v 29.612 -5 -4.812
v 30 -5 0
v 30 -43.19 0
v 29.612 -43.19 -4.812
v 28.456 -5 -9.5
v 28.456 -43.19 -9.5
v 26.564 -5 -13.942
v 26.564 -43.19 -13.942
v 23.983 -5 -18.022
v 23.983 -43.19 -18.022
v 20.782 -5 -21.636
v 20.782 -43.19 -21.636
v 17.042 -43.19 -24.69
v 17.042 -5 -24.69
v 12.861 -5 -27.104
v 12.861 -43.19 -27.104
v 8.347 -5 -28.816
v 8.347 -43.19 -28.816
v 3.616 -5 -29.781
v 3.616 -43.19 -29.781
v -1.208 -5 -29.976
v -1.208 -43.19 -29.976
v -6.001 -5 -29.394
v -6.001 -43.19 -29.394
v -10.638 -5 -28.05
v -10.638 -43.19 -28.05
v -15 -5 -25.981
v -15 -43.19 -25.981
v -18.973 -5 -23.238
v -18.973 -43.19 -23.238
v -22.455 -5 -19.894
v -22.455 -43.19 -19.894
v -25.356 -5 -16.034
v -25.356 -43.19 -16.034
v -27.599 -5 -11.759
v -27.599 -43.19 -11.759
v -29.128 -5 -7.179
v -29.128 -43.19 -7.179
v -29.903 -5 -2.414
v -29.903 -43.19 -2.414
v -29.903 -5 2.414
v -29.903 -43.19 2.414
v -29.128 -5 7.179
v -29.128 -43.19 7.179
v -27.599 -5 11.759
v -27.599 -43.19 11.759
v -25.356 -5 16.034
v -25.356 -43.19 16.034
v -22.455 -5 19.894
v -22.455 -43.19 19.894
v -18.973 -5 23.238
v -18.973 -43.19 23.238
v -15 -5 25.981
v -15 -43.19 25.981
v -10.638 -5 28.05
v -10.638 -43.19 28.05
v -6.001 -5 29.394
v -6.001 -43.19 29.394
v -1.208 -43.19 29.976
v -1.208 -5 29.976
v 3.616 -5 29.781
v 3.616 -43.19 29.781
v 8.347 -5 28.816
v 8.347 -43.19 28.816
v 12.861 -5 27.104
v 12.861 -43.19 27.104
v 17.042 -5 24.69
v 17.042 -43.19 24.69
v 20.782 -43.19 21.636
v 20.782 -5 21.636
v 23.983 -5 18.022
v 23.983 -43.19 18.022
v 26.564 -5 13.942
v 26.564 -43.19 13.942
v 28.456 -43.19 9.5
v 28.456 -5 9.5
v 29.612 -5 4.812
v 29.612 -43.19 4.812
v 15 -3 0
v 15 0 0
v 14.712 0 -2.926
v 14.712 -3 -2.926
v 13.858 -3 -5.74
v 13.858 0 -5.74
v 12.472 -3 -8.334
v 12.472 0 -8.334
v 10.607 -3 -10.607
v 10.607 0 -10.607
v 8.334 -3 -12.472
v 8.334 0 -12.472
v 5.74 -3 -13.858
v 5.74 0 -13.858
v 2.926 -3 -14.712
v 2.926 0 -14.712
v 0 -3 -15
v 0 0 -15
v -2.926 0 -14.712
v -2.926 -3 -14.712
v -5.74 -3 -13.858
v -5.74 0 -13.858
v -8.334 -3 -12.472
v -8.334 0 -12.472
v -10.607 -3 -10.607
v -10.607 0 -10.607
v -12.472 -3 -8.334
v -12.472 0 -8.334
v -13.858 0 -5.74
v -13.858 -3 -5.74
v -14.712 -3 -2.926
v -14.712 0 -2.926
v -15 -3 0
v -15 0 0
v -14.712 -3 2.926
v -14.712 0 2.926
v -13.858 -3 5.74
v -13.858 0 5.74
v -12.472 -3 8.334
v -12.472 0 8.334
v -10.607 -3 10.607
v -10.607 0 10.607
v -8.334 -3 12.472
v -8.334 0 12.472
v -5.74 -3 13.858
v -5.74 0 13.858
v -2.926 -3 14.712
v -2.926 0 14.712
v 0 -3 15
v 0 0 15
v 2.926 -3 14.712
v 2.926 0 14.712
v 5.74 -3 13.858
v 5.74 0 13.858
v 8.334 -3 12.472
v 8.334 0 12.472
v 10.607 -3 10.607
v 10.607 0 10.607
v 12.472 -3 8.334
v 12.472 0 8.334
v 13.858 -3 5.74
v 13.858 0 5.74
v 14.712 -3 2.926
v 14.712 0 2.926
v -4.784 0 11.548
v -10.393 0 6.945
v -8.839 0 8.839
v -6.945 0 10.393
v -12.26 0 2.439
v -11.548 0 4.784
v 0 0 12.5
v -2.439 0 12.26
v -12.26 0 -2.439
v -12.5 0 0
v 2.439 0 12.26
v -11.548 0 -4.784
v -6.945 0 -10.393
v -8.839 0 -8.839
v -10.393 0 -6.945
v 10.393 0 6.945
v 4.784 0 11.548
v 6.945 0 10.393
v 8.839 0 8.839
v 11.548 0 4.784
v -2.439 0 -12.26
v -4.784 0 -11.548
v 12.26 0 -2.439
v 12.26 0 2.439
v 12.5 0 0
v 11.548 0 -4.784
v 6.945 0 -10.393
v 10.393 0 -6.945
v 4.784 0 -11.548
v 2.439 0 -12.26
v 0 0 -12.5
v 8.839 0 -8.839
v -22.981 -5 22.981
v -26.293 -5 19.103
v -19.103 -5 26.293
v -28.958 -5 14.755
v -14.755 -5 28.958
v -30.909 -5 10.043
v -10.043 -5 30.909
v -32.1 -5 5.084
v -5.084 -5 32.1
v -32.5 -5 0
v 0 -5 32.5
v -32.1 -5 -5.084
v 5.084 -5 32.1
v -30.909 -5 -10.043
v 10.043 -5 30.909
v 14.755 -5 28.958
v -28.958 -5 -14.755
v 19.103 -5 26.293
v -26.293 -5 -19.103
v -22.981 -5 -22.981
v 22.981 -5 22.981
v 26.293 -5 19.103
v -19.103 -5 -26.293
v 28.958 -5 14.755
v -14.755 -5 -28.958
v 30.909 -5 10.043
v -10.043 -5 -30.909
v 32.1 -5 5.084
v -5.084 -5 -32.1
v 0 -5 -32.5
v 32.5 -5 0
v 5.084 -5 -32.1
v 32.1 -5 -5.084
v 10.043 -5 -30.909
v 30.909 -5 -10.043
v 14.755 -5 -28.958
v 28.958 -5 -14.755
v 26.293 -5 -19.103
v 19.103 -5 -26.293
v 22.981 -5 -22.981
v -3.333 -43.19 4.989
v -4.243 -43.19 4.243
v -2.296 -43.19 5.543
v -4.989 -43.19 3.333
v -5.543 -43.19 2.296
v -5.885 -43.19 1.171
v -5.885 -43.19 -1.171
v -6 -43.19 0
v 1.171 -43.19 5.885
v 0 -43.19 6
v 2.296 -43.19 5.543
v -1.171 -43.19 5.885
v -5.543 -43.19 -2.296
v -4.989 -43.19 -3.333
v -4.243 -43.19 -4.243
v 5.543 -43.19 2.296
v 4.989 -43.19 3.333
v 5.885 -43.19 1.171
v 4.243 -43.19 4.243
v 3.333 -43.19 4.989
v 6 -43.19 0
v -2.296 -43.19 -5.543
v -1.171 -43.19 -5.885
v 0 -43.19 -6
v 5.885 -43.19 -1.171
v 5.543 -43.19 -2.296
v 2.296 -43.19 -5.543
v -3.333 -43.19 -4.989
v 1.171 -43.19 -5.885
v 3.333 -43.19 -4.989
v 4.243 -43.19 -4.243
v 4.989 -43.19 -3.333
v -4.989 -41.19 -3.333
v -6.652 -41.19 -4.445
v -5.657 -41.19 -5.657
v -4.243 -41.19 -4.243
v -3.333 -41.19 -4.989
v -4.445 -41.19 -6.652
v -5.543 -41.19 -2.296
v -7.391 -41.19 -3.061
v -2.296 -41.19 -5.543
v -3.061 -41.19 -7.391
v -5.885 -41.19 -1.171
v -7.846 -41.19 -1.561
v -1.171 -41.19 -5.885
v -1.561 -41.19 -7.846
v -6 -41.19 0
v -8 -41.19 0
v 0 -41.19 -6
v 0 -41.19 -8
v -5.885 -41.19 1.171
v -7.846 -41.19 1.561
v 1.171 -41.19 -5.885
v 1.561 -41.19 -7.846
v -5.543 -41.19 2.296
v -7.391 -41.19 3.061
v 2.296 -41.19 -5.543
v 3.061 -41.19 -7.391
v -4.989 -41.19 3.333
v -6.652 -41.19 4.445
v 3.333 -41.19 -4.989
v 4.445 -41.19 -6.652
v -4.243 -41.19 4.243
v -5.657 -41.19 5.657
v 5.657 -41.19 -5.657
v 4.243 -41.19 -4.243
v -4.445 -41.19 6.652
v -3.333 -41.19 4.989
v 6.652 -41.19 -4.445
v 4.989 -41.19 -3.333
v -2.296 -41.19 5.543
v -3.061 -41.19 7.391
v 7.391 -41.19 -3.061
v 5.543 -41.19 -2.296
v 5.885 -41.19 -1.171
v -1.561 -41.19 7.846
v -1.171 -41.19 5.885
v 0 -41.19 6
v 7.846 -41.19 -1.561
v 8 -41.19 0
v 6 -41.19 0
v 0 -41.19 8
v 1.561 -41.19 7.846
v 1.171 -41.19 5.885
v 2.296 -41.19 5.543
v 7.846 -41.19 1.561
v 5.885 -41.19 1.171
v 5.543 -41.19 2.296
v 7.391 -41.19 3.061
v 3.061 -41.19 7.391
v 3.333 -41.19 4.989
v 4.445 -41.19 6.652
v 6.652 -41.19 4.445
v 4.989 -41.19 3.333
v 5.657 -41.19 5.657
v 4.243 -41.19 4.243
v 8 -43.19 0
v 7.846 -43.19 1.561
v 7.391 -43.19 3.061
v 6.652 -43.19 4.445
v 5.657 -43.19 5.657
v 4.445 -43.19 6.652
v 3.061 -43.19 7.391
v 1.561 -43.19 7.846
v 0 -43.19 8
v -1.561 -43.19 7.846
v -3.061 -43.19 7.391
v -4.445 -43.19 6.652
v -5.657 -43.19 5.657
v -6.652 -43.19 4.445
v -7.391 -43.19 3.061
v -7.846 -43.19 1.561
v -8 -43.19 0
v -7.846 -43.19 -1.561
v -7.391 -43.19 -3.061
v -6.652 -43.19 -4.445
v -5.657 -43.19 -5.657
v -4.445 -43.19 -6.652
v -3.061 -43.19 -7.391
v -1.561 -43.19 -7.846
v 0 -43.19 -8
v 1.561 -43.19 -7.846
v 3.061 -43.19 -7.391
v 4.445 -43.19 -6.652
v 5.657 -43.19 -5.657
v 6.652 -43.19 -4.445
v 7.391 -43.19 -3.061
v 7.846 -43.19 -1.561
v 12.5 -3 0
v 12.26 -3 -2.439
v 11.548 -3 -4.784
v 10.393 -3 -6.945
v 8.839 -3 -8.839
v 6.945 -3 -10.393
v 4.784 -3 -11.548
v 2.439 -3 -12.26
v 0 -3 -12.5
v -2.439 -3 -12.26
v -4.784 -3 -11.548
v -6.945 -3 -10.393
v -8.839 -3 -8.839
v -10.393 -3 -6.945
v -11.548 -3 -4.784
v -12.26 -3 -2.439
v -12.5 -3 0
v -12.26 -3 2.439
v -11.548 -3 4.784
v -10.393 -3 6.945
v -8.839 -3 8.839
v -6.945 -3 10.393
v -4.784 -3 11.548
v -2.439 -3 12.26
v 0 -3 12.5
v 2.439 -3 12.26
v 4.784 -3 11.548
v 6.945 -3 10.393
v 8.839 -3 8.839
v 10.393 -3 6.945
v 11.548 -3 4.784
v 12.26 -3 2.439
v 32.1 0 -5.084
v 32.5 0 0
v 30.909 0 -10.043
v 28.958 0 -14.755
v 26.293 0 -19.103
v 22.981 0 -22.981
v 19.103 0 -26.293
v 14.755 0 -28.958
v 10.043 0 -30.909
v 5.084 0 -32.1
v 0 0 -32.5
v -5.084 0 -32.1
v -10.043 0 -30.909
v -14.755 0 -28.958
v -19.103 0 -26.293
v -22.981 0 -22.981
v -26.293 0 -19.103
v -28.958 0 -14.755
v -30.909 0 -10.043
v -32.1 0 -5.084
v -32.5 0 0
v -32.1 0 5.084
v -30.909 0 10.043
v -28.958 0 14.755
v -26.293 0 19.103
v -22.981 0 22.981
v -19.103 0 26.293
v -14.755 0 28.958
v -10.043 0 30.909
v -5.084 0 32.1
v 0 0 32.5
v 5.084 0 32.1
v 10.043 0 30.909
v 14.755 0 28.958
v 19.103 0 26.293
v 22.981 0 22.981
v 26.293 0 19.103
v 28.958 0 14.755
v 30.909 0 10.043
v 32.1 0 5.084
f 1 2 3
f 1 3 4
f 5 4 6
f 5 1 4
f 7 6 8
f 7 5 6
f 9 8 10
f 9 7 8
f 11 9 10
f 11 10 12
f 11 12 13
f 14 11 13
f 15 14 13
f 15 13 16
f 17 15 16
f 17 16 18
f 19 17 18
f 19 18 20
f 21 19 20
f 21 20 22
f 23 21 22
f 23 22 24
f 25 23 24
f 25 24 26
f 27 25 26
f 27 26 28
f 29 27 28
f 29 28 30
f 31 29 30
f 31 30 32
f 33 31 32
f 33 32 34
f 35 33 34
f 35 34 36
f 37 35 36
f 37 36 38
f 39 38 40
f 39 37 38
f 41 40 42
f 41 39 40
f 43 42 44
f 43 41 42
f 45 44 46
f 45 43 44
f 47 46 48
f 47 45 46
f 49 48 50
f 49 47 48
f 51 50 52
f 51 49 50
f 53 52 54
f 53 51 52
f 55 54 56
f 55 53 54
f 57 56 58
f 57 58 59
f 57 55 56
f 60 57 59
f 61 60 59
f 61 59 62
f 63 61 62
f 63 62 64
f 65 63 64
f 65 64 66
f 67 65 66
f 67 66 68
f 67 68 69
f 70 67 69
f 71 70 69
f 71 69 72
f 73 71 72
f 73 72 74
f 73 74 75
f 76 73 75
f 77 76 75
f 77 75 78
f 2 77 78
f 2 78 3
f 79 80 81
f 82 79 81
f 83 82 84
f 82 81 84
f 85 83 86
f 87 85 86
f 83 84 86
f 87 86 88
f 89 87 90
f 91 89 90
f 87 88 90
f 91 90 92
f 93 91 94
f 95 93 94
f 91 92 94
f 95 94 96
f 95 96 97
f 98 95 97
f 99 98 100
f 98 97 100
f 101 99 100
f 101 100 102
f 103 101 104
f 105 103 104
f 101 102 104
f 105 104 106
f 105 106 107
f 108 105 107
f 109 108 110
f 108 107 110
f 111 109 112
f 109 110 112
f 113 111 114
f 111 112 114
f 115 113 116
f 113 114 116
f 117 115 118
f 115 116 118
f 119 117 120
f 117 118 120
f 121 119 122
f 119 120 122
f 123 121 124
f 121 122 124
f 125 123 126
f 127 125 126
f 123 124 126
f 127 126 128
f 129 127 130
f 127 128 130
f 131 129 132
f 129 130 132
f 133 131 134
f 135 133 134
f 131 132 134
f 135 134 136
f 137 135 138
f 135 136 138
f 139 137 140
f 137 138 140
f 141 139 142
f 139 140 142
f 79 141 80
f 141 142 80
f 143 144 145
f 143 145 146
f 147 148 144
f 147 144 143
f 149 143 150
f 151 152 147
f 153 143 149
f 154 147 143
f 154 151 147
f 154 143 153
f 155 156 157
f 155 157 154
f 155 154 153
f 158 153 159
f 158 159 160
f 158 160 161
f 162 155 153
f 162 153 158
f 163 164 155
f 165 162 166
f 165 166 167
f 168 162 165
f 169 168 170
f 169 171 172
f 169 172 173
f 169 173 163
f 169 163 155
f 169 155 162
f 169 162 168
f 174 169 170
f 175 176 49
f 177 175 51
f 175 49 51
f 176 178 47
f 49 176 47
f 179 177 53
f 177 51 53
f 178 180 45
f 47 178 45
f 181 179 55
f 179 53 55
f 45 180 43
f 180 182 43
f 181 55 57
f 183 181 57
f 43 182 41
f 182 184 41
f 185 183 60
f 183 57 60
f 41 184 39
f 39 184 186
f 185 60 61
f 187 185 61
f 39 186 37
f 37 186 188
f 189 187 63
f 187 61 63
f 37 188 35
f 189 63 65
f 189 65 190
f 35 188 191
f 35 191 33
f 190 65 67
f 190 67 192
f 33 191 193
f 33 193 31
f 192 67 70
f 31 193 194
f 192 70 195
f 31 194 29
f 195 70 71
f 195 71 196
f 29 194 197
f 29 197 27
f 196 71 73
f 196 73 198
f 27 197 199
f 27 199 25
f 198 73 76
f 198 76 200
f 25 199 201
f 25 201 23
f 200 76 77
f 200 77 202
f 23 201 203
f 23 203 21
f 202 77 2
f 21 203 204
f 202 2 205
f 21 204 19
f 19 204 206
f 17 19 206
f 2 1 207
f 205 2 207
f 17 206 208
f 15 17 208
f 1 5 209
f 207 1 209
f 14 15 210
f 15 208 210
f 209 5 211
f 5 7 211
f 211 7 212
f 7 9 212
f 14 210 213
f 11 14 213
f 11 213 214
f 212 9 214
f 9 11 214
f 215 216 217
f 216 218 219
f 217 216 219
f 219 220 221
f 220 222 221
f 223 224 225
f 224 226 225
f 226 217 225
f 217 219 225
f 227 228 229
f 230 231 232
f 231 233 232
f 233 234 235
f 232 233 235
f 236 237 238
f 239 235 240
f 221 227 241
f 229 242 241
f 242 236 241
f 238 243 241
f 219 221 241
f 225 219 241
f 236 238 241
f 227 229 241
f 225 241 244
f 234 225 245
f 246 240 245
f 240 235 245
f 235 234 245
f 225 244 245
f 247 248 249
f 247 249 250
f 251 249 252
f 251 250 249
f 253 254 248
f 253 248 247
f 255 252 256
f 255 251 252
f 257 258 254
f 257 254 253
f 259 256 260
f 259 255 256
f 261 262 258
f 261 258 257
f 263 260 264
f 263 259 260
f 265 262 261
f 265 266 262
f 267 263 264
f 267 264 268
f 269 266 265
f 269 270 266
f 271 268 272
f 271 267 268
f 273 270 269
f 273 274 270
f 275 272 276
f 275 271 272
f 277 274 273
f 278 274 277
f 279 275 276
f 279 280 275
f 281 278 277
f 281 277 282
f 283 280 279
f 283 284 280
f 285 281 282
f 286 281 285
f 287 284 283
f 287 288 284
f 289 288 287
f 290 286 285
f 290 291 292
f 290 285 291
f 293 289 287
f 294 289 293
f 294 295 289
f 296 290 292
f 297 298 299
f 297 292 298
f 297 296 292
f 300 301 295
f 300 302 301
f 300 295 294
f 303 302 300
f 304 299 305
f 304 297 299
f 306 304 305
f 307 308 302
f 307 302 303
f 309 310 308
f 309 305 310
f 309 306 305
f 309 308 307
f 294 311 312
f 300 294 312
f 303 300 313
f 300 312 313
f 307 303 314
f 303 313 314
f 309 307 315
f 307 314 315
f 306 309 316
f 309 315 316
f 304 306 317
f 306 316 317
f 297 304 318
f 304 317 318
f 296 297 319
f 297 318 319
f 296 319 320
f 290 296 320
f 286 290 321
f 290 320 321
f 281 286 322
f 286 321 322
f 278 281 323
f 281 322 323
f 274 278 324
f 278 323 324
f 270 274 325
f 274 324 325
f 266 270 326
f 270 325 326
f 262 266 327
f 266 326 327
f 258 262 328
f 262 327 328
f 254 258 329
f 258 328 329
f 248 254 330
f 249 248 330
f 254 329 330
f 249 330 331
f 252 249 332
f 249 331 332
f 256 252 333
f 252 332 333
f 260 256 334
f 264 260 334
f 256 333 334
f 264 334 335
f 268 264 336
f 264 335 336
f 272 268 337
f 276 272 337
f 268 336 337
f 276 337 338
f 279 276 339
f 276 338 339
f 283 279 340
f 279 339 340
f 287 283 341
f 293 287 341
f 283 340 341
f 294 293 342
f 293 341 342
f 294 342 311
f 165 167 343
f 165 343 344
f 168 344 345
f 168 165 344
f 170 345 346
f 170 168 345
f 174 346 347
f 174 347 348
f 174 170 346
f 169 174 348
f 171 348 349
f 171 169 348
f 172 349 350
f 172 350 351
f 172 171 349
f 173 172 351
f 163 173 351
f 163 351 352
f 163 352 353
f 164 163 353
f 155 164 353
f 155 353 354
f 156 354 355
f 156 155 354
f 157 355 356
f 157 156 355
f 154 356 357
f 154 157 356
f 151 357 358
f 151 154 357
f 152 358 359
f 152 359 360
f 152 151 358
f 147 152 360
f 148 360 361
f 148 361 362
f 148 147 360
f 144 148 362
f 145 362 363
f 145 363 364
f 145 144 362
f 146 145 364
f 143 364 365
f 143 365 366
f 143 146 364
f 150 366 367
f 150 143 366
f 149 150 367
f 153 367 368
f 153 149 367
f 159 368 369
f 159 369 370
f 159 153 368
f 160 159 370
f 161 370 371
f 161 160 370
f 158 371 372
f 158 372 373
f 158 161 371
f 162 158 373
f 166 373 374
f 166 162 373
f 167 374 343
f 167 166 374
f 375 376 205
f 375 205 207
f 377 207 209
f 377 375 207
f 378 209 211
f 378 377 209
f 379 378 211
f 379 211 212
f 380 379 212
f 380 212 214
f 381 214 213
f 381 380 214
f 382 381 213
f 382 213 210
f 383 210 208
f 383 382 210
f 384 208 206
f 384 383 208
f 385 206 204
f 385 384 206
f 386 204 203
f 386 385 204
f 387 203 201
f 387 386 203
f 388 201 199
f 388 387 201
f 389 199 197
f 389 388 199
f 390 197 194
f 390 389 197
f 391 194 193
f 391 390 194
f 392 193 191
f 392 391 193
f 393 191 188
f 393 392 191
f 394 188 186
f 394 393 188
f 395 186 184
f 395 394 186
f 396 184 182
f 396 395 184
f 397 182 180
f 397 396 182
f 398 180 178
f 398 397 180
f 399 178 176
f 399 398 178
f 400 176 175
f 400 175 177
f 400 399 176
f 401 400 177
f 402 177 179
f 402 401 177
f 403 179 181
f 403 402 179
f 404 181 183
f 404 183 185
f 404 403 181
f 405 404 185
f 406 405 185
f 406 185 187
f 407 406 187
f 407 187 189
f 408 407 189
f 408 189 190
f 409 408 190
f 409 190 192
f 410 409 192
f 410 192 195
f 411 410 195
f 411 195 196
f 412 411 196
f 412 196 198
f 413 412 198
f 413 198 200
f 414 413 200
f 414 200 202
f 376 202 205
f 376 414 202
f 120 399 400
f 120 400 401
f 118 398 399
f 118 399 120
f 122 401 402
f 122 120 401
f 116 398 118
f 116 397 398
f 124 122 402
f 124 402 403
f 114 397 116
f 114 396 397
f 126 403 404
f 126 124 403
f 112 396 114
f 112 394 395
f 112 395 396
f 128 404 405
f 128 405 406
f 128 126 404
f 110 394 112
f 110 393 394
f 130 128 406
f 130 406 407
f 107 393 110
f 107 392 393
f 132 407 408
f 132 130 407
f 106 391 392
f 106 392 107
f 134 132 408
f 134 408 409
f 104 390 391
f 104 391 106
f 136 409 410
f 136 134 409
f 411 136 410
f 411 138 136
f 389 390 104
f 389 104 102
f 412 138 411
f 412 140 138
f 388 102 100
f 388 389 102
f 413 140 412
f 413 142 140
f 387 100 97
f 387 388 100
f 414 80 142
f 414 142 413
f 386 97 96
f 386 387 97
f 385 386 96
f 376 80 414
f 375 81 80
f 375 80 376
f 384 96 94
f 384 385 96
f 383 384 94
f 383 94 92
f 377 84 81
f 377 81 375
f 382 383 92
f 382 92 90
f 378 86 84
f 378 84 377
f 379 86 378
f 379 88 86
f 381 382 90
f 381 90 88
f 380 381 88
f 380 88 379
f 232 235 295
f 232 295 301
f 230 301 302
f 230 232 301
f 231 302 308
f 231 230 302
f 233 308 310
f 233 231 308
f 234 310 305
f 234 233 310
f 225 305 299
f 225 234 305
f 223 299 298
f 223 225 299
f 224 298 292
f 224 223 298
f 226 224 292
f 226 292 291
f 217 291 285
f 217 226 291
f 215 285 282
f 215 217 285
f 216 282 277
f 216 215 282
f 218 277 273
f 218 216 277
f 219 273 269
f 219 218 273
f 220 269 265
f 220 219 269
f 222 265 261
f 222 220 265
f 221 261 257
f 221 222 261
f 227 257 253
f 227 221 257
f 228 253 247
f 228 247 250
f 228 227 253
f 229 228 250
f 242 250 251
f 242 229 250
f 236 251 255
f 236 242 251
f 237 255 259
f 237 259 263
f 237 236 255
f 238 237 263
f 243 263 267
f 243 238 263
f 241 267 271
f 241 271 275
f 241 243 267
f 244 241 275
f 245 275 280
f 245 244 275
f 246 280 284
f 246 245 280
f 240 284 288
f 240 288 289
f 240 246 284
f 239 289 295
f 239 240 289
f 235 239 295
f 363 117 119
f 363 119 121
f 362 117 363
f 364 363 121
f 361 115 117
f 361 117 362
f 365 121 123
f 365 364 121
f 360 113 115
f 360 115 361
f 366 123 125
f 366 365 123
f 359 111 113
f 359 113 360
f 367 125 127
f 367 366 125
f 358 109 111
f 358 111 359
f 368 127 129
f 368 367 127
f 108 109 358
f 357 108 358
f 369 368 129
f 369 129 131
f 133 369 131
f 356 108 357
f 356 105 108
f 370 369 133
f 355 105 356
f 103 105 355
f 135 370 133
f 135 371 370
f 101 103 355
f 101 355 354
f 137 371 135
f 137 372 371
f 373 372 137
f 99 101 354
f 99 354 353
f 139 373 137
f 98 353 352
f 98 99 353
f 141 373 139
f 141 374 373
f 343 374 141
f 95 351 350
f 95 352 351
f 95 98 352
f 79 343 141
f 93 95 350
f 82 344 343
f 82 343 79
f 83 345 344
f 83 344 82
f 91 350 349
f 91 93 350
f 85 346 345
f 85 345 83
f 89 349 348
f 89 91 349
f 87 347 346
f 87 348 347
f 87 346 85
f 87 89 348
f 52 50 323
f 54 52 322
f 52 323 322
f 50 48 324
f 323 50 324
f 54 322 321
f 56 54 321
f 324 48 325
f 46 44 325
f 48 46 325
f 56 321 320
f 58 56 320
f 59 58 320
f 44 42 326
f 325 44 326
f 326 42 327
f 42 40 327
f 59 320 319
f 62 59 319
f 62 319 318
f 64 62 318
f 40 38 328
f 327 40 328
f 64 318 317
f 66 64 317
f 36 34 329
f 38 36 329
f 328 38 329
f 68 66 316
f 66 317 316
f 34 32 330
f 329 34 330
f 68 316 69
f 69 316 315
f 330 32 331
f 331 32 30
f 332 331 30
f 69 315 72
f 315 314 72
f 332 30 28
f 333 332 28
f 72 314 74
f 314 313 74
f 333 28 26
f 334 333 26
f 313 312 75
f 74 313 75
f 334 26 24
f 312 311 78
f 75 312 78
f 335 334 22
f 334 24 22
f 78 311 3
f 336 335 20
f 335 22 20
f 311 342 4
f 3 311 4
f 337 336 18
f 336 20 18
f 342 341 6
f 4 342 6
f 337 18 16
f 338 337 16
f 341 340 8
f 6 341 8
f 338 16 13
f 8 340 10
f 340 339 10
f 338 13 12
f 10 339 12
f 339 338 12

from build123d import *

# Parameters (mm, degrees)
SKETCH1_R            = 30
BOSS_EXTRUDE8_DEPTH  = 43.19
SKETCH1_9_R          = 32.5
SKETCH1_9_R_2        = 30
BOSS_EXTRUDE10_DEPTH = 5
SKETCH2_R            = 8
SKETCH2_R_2          = 6
CUT_EXTRUDE1_DEPTH   = 2
SKETCH3_R            = 15
SKETCH3_R_2          = 12.5
CUT_EXTRUDE2_DEPTH   = 3


with BuildPart() as part:
    # Sketch1 → Boss-Extrude8 (new body)
    with BuildSketch(Plane(origin=(0, 0, 0), x_dir=(1, 0, 0), z_dir=(0, 1, 0))):
        Circle(SKETCH1_R)
    extrude(amount=-BOSS_EXTRUDE8_DEPTH)

    # Sketch1<9> → Boss-Extrude10 (add)
    with BuildSketch(Plane(origin=(0, 0, 0), x_dir=(1, 0, 0), z_dir=(0, 1, 0))):
        Circle(SKETCH1_9_R)
        Circle(SKETCH1_9_R_2, mode=Mode.SUBTRACT)
    extrude(amount=-BOSS_EXTRUDE10_DEPTH)

    # Sketch2 → Cut-Extrude1 (cut)
    with BuildSketch(Plane.XZ.offset(43.19)):
        Circle(SKETCH2_R)
        Circle(SKETCH2_R_2, mode=Mode.SUBTRACT)
    extrude(amount=-CUT_EXTRUDE1_DEPTH, mode=Mode.SUBTRACT)

    # Sketch3 → Cut-Extrude2 (cut)
    with BuildSketch(Plane(origin=(0, 0, 0), x_dir=(1, 0, 0), z_dir=(0, 1, 0))):
        Circle(SKETCH3_R)
        Circle(SKETCH3_R_2, mode=Mode.SUBTRACT)
    extrude(amount=-CUT_EXTRUDE2_DEPTH, mode=Mode.SUBTRACT)


solid = part.part
